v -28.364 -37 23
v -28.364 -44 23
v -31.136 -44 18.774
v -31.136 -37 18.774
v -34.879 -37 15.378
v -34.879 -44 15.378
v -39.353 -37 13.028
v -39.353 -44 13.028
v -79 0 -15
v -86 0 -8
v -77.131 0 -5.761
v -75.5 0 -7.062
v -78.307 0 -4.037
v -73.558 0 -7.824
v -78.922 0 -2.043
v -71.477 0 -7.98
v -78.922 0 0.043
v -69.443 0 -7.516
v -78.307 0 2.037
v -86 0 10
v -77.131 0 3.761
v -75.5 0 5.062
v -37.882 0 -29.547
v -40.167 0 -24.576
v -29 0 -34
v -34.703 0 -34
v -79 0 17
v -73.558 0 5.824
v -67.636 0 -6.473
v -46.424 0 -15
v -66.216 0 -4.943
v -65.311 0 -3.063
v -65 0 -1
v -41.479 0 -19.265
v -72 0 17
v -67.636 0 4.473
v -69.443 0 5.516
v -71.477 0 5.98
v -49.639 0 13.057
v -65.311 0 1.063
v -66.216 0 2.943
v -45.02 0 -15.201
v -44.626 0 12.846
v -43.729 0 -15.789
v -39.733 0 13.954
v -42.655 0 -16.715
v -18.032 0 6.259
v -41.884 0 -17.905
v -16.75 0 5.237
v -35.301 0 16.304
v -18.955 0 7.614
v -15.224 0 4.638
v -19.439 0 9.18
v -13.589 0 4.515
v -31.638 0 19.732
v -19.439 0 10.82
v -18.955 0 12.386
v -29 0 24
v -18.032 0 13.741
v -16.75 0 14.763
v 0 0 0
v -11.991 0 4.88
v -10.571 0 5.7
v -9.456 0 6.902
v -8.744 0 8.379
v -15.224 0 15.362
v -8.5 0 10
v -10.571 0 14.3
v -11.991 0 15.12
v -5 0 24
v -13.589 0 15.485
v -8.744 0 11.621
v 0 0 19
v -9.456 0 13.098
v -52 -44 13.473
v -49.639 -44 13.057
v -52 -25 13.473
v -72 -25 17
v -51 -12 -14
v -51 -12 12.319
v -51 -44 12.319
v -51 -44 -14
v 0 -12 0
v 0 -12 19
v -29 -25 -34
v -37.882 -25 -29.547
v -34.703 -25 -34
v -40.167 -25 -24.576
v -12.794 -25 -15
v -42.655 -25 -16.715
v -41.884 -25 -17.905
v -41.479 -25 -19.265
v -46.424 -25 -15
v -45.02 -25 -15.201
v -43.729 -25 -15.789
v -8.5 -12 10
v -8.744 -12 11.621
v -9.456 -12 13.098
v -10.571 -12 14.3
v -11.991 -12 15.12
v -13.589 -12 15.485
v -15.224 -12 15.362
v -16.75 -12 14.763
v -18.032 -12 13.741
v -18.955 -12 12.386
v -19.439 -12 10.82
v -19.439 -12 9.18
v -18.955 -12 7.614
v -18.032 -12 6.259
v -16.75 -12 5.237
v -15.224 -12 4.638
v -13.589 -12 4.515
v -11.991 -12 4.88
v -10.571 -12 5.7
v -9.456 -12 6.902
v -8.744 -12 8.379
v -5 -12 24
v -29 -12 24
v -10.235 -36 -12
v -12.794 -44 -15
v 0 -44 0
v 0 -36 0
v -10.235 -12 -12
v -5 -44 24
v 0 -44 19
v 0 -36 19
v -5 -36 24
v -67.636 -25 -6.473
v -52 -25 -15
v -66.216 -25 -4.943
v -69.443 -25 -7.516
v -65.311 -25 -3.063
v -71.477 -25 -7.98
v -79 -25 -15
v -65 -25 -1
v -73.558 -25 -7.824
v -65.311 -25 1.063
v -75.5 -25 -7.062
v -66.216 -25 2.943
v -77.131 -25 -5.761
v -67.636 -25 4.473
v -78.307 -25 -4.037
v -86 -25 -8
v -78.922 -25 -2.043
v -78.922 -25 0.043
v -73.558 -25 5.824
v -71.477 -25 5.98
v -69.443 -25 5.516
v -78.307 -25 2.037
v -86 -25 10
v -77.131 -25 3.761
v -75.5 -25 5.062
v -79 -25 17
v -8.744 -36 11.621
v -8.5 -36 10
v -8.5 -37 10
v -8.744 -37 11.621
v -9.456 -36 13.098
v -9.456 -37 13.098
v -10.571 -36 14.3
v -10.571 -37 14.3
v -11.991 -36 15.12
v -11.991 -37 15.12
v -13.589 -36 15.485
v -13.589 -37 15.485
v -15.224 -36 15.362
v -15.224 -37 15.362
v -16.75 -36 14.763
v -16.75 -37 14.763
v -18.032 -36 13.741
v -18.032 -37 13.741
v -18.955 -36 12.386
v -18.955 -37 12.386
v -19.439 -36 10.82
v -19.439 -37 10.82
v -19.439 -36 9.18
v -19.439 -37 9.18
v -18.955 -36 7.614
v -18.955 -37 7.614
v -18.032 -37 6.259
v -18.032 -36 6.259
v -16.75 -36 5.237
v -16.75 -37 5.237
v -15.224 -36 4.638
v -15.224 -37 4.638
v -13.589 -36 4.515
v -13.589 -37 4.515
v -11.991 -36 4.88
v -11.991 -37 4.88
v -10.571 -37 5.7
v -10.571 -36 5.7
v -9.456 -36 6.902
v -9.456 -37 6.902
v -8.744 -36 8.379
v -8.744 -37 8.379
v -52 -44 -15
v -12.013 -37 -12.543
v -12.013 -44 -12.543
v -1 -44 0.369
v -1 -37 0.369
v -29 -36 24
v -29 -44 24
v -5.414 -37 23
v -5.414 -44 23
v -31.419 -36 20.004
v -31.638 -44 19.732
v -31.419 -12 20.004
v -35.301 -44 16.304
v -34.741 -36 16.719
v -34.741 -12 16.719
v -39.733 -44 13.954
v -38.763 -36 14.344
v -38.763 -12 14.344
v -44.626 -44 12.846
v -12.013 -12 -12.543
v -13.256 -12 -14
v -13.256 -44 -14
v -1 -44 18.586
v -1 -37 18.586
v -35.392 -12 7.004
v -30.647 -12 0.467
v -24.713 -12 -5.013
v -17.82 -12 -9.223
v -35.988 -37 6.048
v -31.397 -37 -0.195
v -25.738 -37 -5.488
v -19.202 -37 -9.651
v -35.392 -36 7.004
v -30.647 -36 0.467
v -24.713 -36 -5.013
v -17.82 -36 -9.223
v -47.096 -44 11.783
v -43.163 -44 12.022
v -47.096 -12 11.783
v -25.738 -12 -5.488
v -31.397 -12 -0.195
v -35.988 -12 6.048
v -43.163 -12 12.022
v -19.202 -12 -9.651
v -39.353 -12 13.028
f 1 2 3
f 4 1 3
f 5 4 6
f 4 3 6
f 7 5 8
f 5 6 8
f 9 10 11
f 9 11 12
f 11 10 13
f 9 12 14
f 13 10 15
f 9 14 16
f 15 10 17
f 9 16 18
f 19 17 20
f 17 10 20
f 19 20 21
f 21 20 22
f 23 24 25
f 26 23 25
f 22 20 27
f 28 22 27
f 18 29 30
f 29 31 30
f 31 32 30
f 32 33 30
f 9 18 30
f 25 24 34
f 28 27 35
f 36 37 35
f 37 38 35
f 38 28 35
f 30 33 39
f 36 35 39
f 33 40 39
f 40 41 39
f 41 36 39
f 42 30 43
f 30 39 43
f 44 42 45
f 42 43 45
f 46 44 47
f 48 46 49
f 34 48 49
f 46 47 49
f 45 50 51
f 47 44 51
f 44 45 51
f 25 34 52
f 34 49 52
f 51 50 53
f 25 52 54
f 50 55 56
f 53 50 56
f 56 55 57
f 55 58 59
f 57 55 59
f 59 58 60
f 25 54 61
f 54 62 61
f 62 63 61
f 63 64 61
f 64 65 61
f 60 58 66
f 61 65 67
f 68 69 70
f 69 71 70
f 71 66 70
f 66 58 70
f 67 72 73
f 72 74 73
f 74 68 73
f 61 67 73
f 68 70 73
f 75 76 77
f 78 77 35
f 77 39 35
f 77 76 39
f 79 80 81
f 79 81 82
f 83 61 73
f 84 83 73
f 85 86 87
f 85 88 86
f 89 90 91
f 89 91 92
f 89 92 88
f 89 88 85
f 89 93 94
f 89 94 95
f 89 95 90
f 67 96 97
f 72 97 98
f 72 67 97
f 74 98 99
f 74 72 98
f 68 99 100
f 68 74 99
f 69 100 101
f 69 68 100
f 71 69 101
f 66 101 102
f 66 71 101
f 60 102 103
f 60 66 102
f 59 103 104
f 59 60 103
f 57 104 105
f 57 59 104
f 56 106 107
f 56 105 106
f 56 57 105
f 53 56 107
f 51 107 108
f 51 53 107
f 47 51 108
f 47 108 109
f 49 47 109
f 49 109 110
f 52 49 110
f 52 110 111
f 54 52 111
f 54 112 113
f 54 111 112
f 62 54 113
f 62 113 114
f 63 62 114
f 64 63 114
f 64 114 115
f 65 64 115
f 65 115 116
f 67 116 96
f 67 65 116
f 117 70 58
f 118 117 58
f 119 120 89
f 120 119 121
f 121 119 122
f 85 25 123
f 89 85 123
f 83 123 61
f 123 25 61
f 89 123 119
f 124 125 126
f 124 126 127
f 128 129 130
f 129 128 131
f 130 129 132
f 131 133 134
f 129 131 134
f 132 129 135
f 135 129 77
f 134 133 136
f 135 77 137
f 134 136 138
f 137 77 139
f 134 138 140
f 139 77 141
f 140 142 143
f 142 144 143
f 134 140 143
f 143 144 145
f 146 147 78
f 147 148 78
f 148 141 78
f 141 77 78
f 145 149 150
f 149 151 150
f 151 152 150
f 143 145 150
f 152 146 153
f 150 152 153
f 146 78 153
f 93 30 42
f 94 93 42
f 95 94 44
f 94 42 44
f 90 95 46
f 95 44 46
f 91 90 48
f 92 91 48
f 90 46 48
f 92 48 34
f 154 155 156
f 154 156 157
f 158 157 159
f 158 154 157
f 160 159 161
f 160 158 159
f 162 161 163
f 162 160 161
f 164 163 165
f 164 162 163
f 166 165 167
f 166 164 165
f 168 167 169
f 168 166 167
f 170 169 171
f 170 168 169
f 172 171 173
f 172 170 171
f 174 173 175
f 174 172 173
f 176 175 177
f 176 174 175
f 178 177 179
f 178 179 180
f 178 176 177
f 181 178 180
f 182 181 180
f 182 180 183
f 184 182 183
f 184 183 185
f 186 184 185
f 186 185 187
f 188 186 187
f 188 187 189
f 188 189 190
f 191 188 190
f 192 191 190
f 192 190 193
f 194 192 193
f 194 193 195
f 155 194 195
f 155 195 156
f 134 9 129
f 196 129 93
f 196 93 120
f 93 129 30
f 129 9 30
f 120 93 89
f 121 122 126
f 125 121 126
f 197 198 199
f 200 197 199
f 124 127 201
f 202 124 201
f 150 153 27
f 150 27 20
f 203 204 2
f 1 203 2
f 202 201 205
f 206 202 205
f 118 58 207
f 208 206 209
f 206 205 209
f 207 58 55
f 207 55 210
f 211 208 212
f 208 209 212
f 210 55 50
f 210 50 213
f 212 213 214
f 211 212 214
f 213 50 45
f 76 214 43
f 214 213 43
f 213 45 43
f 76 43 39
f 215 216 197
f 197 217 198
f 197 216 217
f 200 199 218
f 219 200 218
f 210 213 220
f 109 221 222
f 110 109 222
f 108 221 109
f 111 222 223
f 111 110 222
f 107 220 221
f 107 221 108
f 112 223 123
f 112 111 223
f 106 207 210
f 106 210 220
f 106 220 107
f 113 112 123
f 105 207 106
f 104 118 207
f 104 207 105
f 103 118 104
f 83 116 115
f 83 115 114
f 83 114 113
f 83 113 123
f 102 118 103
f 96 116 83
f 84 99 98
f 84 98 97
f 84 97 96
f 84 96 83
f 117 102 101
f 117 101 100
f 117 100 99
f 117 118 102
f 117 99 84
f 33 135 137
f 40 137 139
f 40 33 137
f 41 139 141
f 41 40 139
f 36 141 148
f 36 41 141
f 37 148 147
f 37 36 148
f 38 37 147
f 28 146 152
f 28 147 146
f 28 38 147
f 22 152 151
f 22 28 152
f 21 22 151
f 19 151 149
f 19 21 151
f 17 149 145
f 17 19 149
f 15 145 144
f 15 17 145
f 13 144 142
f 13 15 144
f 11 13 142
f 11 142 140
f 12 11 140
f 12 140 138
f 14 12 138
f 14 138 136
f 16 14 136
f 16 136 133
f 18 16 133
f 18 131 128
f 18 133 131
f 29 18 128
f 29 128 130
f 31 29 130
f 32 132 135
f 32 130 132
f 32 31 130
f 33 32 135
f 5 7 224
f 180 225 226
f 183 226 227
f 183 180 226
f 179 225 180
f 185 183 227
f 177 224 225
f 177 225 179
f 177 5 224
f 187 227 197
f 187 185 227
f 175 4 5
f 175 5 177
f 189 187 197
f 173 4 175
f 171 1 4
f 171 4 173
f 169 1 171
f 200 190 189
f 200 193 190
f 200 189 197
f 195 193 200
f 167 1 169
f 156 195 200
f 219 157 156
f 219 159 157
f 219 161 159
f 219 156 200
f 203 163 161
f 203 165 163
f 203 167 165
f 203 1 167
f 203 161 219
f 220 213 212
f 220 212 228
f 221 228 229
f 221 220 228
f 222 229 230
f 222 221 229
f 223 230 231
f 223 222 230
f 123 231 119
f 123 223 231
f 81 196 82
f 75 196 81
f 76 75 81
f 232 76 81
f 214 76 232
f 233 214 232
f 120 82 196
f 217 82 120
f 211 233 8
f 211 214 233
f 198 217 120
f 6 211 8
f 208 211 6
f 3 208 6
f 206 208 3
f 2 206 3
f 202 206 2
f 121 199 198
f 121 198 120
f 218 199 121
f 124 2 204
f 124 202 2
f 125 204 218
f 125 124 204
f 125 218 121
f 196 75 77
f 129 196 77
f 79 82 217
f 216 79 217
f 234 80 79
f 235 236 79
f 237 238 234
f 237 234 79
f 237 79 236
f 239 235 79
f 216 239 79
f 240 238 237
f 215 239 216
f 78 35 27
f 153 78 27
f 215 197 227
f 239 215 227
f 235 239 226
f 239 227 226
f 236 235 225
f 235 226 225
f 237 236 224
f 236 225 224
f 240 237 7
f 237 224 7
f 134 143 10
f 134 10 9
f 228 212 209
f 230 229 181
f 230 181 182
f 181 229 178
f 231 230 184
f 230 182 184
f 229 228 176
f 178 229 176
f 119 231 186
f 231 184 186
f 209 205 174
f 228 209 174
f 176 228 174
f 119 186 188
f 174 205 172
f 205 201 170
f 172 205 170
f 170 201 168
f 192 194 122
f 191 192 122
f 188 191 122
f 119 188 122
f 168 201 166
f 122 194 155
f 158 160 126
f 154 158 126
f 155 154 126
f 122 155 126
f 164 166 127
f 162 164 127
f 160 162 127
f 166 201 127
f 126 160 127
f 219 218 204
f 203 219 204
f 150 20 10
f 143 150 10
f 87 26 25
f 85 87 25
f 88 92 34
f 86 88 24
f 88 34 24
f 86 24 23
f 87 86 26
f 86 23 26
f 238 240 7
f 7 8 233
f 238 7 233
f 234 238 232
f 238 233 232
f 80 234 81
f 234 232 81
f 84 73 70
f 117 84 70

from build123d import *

# Parameters (mm, degrees)
F0_R      = 7
F0_R_2    = 5.5
F1_DEPTH  = 44
F2_W      = 20
F2_H      = 19
F2_W_2    = 7
F3_DEPTH  = 51.001
F6_DEPTH  = 24
F8_DEPTH  = 19
F9_R      = 5.5
F10_DEPTH = 7
F11_DEPTH = 32


with BuildPart() as f1:
    # F0 (on Front) → F1 (new body)
    with BuildSketch(Plane.XZ):
        with BuildLine():
            Line((-5, 24), (-29, 24))
            ThreePointArc((-29, 24), (-37.4389012943, 14.9820441422), (-49.6386191642, 13.0570852328))
            Line((-49.6386191642, 13.0570852328), (-72, 17))
            Line((-72, 17), (-79, 17))
            Line((-79, 17), (-86, 10))
            Line((-86, 10), (-86, -8))
            Line((-86, -8), (-79, -15))
            Line((-79, -15), (-46.4244610887, -15))
            ThreePointArc((-46.4244610887, -15), (-43.1592253076, -16.2134137678), (-41.4788223472, -19.2647058824))
            ThreePointArc((-41.4788223472, -19.2647058824), (-39.1419921441, -27.115672061), (-34.7030199473, -34))
            Line((-34.7030199473, -34), (-29, -34))
            Line((-29, -34), (0, 0))
            Line((0, 0), (0, 19))
            Line((0, 19), (-5, 24))
        make_face()
        with Locations((-72, -1)):
            Circle(F0_R, mode=Mode.SUBTRACT)
        with Locations((-14, 10)):
            Circle(F0_R_2, mode=Mode.SUBTRACT)
    extrude(amount=F1_DEPTH)

    # F2 (on face) → F3 (cut, through all)
    with BuildSketch(Plane.XY.offset(17)):
        with Locations((-62, -34.5)):
            Rectangle(F2_W, F2_H)
        with Locations((-75.5, -34.5)):
            Rectangle(F2_W_2, F2_H)
        with Locations((-82.5, -34.5)):
            Rectangle(F2_W_2, F2_H)
    extrude(amount=-F3_DEPTH, mode=Mode.SUBTRACT)

    # F5 (on offset) → F6 (cut)
    with BuildSketch(Plane.XZ.offset(12)):
        with BuildLine():
            Line((-10.2352941176, -12), (0, 0))
            Line((0, 0), (0, 19))
            Line((0, 19), (-5, 24))
            Line((-5, 24), (-29, 24))
            ThreePointArc((-29, 24), (-32.9787556567, 18.2593336205), (-38.763063451, 14.3442946173))
            ThreePointArc((-38.763063451, 14.3442946173), (-27.8157370175, -2.4192947713), (-10.2352941176, -12))
        make_face()
    extrude(amount=F6_DEPTH, mode=Mode.SUBTRACT)

    # F7 (on face) → F8 (cut)
    with BuildSketch(Plane.XZ.offset(44)):
        with BuildLine():
            Line((-46.4244610887, -15), (-52, -15))
            Line((-52, -15), (-52, -51.1183999479))
            Line((-52, -51.1183999479), (24.7316434979, -51.1183999479))
            Line((24.7316434979, -51.1183999479), (24.7316434979, -15))
            Line((24.7316434979, -15), (-12.7941176471, -15))
            Line((-12.7941176471, -15), (-29, -34))
            Line((-29, -34), (-34.7030199473, -34))
            ThreePointArc((-34.7030199473, -34), (-39.1419921441, -27.115672061), (-41.4788223472, -19.2647058824))
            ThreePointArc((-41.4788223472, -19.2647058824), (-43.1592253076, -16.2134137678), (-46.4244610887, -15))
        make_face()
        with BuildLine():
            Line((-12.7941176471, -15), (-46.4244610887, -15))
            ThreePointArc((-46.4244610887, -15), (-43.1592253076, -16.2134137678), (-41.4788223472, -19.2647058824))
            ThreePointArc((-41.4788223472, -19.2647058824), (-39.1419921441, -27.115672061), (-34.7030199473, -34))
            Line((-34.7030199473, -34), (-29, -34))
            Line((-29, -34), (-12.7941176471, -15))
        make_face()
    extrude(amount=-F8_DEPTH, mode=Mode.SUBTRACT)

    # F9 (on face) → F10 (cut)
    with BuildSketch(Plane.XZ.offset(44)):
        with BuildLine():
            ThreePointArc((-28.3639153145, 23), (-32.8995598011, 16.9571773079), (-39.3533170567, 13.0282087051))
            ThreePointArc((-39.3533170567, 13.0282087051), (-28.689818317, -2.9721273618), (-12.0131522532, -12.5434265746))
            Line((-12.0131522532, -12.5434265746), (-1, 0.3685450325))
            Line((-1, 0.3685450325), (-1, 18.5857864376))
            Line((-1, 18.5857864376), (-5.4142135624, 23))
            Line((-5.4142135624, 23), (-28.3639153145, 23))
        make_face()
        with Locations((-14, 10)):
            Circle(F9_R, mode=Mode.SUBTRACT)
    extrude(amount=-F10_DEPTH, mode=Mode.SUBTRACT)

    # F9 (on face) → F11 (cut, through all)
    with BuildSketch(Plane.XZ.offset(44)):
        with BuildLine():
            Line((-51, 12.3190646627), (-51, -14))
            Line((-51, -14), (-13.2555237042, -14))
            Line((-13.2555237042, -14), (-12.0131522532, -12.5434265746))
            ThreePointArc((-12.0131522532, -12.5434265746), (-28.689818317, -2.9721273618), (-39.3533170567, 13.0282087051))
            ThreePointArc((-39.3533170567, 13.0282087051), (-45.1237934763, 11.805403344), (-51, 12.3190646627))
        make_face()
    extrude(amount=-F11_DEPTH, mode=Mode.SUBTRACT)


solid = f1.part
